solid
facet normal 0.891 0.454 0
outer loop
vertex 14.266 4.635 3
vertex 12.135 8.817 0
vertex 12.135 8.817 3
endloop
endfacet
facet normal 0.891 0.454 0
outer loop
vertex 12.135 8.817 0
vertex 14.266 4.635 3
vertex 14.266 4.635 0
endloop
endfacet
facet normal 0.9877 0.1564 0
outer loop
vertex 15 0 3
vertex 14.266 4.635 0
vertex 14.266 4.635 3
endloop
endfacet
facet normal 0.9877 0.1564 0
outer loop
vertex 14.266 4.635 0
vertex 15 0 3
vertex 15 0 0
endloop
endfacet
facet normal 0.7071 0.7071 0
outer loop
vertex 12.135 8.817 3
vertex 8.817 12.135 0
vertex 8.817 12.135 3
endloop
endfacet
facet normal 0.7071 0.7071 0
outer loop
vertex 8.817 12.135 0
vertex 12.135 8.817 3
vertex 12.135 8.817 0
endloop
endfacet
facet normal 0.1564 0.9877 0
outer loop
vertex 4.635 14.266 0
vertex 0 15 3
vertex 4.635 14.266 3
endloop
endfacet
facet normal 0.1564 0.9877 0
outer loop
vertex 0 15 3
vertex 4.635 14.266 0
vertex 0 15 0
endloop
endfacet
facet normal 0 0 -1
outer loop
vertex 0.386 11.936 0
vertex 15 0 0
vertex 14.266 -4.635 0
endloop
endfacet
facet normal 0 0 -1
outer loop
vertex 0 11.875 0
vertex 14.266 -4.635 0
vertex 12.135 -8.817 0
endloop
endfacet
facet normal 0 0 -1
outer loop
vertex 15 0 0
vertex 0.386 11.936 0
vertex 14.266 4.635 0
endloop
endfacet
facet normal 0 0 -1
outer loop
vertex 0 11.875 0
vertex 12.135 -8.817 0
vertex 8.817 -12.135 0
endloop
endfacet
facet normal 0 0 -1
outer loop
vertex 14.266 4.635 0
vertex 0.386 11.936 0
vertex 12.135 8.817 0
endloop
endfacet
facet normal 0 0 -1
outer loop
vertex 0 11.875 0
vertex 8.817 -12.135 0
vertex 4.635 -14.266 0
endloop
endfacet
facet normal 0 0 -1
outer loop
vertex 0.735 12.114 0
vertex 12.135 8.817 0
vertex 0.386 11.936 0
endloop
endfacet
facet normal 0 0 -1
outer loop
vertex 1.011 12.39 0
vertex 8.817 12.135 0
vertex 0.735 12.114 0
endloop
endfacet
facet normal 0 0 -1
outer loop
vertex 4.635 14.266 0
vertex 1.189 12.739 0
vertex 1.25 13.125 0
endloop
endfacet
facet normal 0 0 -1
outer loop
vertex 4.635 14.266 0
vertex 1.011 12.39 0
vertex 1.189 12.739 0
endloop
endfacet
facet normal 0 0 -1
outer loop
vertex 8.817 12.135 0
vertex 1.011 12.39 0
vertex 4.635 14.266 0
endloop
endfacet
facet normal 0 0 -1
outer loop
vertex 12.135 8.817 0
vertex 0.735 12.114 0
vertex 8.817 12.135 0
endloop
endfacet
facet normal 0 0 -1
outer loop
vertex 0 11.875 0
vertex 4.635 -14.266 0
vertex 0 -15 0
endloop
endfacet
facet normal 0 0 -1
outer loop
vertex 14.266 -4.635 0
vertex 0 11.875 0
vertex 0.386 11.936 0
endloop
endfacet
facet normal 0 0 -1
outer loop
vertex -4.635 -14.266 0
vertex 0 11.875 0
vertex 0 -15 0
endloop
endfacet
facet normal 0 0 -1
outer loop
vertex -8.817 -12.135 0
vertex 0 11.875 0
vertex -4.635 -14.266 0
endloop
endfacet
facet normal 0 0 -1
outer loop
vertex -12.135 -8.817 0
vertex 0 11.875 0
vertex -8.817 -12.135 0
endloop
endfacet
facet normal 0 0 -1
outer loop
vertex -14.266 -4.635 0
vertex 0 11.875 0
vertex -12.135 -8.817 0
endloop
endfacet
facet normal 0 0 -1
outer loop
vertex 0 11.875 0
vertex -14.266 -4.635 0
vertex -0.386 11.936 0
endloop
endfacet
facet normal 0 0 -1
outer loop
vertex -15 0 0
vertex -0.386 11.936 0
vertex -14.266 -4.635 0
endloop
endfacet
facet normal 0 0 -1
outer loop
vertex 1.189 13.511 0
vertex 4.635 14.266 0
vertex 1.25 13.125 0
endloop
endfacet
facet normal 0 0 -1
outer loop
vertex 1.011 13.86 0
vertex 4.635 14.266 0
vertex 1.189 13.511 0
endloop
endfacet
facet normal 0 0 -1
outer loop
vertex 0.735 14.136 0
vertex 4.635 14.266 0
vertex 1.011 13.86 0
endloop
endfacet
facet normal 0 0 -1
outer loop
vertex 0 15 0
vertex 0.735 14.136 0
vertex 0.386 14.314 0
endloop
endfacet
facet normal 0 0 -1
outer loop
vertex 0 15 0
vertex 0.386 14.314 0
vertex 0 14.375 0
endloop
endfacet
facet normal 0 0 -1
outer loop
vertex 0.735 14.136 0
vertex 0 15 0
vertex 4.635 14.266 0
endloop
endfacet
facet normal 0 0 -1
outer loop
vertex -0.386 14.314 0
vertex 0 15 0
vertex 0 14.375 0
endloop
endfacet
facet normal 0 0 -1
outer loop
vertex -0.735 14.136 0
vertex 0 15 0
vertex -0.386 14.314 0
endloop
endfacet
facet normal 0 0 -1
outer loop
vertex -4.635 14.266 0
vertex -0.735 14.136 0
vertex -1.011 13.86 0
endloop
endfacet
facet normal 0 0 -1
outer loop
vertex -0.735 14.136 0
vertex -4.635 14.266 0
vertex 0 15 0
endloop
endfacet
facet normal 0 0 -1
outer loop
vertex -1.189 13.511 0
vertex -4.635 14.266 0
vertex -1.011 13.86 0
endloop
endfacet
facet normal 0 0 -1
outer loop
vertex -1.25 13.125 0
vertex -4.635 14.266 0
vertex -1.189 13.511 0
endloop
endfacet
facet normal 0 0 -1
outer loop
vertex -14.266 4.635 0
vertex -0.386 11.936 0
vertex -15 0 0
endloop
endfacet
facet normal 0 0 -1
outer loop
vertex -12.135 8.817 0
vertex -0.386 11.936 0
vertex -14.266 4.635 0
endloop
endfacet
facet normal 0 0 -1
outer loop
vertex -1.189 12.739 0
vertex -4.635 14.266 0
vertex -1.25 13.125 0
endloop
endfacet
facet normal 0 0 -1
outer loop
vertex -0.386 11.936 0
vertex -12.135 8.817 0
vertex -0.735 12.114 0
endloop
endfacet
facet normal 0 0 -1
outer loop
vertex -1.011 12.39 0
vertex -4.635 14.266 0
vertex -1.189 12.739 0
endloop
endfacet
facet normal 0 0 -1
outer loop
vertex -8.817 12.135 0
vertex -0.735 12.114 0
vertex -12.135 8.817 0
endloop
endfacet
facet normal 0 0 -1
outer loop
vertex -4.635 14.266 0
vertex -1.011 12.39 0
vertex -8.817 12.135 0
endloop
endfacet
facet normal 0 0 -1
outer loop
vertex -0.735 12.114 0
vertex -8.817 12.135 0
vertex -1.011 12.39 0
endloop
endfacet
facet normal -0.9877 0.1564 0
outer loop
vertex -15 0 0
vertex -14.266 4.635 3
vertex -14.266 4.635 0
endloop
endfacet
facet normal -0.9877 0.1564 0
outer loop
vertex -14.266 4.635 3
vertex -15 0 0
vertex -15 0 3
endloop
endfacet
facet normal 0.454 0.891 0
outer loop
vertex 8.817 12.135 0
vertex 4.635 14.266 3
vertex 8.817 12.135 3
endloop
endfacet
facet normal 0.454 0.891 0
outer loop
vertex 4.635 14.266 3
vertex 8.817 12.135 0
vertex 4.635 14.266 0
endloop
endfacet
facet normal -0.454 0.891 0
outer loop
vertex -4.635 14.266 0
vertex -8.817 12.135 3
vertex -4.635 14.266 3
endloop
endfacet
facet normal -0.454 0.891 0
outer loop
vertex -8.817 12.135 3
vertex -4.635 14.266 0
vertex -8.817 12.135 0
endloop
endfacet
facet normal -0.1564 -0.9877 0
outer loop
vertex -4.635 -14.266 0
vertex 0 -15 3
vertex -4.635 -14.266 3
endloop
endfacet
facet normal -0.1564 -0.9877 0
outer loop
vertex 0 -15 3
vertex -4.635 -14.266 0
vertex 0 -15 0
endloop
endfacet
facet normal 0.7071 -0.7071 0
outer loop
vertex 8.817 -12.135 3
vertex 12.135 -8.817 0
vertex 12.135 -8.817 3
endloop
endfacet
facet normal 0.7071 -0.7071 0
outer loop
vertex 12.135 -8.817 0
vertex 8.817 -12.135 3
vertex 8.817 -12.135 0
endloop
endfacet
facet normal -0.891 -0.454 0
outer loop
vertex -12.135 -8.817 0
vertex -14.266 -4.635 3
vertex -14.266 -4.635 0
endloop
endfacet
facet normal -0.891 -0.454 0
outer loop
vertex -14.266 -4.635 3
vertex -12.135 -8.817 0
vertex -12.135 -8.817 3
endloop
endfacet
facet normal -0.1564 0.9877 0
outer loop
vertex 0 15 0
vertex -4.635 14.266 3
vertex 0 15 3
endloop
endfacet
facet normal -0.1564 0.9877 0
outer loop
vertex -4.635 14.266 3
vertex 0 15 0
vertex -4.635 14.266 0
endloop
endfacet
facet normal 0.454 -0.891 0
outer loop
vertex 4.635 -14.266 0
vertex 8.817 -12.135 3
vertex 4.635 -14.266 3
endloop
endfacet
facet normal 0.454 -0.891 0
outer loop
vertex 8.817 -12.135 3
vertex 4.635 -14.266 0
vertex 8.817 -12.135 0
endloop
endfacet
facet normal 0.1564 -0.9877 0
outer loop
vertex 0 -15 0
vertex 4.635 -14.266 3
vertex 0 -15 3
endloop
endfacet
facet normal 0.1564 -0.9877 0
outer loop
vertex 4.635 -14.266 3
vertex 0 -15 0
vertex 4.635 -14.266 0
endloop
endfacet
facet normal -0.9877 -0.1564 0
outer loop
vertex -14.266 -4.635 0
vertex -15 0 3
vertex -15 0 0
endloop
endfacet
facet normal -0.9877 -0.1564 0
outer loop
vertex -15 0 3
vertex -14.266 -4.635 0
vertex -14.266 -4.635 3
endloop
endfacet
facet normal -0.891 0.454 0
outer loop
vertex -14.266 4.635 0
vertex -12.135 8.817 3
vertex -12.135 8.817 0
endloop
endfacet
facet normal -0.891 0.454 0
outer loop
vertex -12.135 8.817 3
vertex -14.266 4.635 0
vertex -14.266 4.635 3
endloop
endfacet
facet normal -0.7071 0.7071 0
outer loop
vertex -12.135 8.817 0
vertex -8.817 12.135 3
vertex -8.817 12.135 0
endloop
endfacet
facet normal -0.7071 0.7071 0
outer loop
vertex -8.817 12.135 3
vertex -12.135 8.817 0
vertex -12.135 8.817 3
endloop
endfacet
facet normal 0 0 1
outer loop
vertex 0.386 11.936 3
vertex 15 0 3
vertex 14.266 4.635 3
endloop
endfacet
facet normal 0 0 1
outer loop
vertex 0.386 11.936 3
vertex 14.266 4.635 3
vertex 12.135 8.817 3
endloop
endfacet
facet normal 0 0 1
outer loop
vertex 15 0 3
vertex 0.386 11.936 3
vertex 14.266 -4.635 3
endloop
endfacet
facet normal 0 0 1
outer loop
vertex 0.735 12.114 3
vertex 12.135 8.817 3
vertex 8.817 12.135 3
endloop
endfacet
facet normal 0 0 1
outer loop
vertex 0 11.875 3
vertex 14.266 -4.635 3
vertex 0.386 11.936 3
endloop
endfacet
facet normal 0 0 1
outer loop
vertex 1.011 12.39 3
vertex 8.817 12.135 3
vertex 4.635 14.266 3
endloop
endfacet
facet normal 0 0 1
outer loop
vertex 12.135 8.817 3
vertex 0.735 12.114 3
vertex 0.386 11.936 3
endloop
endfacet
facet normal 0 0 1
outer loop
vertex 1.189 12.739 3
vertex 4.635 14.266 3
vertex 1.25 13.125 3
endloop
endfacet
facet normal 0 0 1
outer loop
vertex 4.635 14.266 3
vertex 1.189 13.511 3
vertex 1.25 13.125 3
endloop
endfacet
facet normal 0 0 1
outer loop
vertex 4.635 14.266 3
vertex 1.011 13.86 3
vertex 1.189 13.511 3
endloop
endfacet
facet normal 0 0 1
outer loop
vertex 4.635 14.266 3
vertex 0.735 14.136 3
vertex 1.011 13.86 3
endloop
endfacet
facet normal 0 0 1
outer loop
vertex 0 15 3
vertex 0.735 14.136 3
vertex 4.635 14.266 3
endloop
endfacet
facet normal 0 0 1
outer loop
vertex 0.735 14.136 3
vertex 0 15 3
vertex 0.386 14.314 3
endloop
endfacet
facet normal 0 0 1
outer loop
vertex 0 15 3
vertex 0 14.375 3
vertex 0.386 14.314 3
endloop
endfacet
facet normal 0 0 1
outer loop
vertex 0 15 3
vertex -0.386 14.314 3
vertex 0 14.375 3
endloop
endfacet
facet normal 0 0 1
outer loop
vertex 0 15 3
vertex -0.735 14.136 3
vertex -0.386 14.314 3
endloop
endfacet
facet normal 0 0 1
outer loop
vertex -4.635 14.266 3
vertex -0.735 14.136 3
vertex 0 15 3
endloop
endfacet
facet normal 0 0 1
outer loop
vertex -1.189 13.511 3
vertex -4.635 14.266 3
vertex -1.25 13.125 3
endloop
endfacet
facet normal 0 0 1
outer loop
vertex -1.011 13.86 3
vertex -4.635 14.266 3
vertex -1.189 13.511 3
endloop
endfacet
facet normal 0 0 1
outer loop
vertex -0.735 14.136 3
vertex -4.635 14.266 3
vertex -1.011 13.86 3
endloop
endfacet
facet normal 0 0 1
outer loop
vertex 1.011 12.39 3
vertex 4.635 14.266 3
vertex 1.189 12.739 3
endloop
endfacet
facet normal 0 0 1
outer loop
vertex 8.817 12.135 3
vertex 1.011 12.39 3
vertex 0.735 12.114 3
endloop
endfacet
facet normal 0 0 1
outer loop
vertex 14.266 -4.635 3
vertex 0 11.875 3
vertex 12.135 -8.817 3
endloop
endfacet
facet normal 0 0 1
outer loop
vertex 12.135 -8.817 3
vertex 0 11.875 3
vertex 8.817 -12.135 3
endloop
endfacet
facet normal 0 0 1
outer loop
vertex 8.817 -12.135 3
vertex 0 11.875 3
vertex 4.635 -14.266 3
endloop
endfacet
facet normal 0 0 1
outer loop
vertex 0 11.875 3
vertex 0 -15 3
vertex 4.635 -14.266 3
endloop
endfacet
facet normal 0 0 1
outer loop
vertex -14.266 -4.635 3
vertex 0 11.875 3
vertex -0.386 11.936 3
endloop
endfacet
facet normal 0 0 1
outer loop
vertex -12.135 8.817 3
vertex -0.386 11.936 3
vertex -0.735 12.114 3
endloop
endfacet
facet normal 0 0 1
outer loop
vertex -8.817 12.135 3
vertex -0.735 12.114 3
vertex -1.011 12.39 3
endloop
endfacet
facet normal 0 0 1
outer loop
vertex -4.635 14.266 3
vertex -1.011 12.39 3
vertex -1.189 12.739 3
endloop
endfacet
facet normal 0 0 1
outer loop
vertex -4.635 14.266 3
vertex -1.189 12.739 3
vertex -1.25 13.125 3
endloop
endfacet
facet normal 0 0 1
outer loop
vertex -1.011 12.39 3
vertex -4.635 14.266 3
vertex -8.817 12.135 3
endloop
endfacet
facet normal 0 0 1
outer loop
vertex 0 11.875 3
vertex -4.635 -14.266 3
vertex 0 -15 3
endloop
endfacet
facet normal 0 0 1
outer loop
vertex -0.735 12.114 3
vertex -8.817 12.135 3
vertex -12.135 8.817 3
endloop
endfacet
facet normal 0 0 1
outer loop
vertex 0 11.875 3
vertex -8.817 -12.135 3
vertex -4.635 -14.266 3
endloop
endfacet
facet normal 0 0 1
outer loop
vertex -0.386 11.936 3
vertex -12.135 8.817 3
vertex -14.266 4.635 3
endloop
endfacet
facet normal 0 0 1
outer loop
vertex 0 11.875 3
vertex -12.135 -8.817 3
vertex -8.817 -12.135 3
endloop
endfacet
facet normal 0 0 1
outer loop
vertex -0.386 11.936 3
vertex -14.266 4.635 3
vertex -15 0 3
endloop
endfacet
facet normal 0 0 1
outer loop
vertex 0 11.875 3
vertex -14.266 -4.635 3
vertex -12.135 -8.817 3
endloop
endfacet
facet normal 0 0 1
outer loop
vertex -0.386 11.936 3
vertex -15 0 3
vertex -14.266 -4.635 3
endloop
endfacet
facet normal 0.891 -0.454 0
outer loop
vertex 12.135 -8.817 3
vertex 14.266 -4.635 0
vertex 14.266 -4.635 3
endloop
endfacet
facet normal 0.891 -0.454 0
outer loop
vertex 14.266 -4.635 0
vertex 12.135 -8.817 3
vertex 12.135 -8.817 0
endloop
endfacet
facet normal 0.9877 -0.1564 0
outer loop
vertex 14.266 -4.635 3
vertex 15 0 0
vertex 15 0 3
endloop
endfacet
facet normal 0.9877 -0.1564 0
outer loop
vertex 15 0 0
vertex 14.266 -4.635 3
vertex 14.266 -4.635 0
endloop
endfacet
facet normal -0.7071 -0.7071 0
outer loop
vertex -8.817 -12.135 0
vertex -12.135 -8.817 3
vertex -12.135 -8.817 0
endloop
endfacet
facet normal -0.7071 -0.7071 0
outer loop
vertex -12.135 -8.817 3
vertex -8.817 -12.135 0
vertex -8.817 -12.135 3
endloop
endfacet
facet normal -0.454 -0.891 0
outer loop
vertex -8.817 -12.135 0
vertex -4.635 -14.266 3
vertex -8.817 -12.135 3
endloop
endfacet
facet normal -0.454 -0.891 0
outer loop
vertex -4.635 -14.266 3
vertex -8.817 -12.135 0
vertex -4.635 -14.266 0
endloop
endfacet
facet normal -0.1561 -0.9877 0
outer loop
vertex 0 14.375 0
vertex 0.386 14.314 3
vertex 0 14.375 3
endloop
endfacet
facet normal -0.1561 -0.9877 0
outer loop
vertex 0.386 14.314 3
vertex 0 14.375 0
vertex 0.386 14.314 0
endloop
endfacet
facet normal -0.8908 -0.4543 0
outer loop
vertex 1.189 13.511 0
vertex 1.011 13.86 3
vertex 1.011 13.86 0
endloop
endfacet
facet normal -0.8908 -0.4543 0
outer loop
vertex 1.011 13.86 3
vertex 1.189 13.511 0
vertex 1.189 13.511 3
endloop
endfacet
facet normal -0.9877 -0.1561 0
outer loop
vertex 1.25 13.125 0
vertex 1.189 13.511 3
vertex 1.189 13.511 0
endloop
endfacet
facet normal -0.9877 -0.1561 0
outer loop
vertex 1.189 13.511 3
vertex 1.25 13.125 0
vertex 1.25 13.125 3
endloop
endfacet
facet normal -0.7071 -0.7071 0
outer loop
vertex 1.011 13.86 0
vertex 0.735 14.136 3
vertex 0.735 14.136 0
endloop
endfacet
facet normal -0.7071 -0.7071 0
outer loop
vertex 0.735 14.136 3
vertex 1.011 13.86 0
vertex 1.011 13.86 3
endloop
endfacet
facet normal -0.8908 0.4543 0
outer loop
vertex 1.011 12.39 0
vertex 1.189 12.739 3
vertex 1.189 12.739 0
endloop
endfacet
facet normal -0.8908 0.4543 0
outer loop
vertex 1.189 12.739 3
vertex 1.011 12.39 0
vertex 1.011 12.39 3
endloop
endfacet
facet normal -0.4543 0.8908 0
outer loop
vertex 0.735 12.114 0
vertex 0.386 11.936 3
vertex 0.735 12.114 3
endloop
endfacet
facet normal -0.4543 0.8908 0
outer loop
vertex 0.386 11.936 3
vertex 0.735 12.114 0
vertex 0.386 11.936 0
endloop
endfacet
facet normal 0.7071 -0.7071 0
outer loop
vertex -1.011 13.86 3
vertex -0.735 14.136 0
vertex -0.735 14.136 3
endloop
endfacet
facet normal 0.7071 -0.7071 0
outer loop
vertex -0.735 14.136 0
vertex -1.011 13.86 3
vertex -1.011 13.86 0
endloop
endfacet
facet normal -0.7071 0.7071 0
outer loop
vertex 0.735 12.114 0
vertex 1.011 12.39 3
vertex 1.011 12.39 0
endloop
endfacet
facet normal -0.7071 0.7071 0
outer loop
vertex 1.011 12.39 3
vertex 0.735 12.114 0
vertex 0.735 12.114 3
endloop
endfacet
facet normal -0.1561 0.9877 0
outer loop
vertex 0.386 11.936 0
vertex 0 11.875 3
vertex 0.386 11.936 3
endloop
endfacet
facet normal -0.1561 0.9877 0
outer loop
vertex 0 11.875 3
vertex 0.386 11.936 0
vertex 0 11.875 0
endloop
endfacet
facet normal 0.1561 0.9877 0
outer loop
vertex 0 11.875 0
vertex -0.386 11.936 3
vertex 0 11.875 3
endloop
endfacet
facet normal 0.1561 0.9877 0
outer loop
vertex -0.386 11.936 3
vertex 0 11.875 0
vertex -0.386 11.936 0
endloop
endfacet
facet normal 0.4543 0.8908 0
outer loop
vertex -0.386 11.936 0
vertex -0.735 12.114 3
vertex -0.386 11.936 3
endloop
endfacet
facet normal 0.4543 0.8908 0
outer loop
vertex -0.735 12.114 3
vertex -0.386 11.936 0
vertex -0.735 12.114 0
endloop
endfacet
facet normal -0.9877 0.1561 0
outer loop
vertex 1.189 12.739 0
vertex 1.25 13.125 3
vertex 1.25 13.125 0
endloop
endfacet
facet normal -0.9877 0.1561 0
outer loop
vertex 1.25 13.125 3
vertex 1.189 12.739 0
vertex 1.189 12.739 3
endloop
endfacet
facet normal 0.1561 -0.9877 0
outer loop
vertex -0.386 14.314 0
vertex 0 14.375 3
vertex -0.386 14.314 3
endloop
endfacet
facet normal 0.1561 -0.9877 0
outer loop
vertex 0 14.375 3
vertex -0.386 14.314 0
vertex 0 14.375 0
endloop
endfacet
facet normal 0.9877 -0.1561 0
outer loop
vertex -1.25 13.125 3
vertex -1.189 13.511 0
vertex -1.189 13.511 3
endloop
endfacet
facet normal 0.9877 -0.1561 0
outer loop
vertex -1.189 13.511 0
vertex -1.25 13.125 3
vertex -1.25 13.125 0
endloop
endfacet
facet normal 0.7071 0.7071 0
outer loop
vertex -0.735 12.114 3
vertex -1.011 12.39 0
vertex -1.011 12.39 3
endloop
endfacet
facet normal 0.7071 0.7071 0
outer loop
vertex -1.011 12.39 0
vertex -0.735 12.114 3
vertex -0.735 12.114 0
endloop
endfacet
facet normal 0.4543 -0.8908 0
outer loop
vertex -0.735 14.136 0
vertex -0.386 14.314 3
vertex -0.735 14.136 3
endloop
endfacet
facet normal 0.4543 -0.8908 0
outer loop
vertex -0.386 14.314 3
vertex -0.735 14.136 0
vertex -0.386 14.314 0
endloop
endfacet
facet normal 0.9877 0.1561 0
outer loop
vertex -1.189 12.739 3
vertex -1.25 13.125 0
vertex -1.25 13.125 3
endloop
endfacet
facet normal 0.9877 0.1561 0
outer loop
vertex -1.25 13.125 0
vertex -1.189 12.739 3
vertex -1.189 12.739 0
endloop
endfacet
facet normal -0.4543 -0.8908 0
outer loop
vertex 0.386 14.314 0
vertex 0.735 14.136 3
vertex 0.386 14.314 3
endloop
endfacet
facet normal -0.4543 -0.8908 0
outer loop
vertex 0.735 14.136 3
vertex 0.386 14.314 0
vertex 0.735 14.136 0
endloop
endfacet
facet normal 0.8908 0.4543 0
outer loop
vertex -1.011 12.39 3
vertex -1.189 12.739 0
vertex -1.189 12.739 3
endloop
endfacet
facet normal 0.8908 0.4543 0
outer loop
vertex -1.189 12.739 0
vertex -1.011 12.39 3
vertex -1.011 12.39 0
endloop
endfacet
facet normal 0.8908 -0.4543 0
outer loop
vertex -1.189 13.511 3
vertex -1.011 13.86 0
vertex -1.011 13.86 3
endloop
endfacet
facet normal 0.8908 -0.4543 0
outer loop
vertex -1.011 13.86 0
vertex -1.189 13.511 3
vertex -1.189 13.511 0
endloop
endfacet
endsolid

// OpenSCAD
// coin dimensions
roundness=20;
coinHeight=3;
coinRadius=15;

// coin image
coinImage="Safenetwork.png";
imageSize=coinRadius*1.5;
imageHeight=coinHeight*1.5;

// pendant option
isPendant=true;

difference(){
    difference(){
        cylinder(h=coinHeight, r=coinRadius, center=false, $fn=roundness);
        resize([imageSize,imageSize,imageHeight])
            surface(file=coinImage, center=true, invert=false);
    }
    if(isPendant){
        translate([0,coinRadius*.875,0])
            cylinder(h=coinHeight, r=1.25, center=false, $fn=20);
    }
}
